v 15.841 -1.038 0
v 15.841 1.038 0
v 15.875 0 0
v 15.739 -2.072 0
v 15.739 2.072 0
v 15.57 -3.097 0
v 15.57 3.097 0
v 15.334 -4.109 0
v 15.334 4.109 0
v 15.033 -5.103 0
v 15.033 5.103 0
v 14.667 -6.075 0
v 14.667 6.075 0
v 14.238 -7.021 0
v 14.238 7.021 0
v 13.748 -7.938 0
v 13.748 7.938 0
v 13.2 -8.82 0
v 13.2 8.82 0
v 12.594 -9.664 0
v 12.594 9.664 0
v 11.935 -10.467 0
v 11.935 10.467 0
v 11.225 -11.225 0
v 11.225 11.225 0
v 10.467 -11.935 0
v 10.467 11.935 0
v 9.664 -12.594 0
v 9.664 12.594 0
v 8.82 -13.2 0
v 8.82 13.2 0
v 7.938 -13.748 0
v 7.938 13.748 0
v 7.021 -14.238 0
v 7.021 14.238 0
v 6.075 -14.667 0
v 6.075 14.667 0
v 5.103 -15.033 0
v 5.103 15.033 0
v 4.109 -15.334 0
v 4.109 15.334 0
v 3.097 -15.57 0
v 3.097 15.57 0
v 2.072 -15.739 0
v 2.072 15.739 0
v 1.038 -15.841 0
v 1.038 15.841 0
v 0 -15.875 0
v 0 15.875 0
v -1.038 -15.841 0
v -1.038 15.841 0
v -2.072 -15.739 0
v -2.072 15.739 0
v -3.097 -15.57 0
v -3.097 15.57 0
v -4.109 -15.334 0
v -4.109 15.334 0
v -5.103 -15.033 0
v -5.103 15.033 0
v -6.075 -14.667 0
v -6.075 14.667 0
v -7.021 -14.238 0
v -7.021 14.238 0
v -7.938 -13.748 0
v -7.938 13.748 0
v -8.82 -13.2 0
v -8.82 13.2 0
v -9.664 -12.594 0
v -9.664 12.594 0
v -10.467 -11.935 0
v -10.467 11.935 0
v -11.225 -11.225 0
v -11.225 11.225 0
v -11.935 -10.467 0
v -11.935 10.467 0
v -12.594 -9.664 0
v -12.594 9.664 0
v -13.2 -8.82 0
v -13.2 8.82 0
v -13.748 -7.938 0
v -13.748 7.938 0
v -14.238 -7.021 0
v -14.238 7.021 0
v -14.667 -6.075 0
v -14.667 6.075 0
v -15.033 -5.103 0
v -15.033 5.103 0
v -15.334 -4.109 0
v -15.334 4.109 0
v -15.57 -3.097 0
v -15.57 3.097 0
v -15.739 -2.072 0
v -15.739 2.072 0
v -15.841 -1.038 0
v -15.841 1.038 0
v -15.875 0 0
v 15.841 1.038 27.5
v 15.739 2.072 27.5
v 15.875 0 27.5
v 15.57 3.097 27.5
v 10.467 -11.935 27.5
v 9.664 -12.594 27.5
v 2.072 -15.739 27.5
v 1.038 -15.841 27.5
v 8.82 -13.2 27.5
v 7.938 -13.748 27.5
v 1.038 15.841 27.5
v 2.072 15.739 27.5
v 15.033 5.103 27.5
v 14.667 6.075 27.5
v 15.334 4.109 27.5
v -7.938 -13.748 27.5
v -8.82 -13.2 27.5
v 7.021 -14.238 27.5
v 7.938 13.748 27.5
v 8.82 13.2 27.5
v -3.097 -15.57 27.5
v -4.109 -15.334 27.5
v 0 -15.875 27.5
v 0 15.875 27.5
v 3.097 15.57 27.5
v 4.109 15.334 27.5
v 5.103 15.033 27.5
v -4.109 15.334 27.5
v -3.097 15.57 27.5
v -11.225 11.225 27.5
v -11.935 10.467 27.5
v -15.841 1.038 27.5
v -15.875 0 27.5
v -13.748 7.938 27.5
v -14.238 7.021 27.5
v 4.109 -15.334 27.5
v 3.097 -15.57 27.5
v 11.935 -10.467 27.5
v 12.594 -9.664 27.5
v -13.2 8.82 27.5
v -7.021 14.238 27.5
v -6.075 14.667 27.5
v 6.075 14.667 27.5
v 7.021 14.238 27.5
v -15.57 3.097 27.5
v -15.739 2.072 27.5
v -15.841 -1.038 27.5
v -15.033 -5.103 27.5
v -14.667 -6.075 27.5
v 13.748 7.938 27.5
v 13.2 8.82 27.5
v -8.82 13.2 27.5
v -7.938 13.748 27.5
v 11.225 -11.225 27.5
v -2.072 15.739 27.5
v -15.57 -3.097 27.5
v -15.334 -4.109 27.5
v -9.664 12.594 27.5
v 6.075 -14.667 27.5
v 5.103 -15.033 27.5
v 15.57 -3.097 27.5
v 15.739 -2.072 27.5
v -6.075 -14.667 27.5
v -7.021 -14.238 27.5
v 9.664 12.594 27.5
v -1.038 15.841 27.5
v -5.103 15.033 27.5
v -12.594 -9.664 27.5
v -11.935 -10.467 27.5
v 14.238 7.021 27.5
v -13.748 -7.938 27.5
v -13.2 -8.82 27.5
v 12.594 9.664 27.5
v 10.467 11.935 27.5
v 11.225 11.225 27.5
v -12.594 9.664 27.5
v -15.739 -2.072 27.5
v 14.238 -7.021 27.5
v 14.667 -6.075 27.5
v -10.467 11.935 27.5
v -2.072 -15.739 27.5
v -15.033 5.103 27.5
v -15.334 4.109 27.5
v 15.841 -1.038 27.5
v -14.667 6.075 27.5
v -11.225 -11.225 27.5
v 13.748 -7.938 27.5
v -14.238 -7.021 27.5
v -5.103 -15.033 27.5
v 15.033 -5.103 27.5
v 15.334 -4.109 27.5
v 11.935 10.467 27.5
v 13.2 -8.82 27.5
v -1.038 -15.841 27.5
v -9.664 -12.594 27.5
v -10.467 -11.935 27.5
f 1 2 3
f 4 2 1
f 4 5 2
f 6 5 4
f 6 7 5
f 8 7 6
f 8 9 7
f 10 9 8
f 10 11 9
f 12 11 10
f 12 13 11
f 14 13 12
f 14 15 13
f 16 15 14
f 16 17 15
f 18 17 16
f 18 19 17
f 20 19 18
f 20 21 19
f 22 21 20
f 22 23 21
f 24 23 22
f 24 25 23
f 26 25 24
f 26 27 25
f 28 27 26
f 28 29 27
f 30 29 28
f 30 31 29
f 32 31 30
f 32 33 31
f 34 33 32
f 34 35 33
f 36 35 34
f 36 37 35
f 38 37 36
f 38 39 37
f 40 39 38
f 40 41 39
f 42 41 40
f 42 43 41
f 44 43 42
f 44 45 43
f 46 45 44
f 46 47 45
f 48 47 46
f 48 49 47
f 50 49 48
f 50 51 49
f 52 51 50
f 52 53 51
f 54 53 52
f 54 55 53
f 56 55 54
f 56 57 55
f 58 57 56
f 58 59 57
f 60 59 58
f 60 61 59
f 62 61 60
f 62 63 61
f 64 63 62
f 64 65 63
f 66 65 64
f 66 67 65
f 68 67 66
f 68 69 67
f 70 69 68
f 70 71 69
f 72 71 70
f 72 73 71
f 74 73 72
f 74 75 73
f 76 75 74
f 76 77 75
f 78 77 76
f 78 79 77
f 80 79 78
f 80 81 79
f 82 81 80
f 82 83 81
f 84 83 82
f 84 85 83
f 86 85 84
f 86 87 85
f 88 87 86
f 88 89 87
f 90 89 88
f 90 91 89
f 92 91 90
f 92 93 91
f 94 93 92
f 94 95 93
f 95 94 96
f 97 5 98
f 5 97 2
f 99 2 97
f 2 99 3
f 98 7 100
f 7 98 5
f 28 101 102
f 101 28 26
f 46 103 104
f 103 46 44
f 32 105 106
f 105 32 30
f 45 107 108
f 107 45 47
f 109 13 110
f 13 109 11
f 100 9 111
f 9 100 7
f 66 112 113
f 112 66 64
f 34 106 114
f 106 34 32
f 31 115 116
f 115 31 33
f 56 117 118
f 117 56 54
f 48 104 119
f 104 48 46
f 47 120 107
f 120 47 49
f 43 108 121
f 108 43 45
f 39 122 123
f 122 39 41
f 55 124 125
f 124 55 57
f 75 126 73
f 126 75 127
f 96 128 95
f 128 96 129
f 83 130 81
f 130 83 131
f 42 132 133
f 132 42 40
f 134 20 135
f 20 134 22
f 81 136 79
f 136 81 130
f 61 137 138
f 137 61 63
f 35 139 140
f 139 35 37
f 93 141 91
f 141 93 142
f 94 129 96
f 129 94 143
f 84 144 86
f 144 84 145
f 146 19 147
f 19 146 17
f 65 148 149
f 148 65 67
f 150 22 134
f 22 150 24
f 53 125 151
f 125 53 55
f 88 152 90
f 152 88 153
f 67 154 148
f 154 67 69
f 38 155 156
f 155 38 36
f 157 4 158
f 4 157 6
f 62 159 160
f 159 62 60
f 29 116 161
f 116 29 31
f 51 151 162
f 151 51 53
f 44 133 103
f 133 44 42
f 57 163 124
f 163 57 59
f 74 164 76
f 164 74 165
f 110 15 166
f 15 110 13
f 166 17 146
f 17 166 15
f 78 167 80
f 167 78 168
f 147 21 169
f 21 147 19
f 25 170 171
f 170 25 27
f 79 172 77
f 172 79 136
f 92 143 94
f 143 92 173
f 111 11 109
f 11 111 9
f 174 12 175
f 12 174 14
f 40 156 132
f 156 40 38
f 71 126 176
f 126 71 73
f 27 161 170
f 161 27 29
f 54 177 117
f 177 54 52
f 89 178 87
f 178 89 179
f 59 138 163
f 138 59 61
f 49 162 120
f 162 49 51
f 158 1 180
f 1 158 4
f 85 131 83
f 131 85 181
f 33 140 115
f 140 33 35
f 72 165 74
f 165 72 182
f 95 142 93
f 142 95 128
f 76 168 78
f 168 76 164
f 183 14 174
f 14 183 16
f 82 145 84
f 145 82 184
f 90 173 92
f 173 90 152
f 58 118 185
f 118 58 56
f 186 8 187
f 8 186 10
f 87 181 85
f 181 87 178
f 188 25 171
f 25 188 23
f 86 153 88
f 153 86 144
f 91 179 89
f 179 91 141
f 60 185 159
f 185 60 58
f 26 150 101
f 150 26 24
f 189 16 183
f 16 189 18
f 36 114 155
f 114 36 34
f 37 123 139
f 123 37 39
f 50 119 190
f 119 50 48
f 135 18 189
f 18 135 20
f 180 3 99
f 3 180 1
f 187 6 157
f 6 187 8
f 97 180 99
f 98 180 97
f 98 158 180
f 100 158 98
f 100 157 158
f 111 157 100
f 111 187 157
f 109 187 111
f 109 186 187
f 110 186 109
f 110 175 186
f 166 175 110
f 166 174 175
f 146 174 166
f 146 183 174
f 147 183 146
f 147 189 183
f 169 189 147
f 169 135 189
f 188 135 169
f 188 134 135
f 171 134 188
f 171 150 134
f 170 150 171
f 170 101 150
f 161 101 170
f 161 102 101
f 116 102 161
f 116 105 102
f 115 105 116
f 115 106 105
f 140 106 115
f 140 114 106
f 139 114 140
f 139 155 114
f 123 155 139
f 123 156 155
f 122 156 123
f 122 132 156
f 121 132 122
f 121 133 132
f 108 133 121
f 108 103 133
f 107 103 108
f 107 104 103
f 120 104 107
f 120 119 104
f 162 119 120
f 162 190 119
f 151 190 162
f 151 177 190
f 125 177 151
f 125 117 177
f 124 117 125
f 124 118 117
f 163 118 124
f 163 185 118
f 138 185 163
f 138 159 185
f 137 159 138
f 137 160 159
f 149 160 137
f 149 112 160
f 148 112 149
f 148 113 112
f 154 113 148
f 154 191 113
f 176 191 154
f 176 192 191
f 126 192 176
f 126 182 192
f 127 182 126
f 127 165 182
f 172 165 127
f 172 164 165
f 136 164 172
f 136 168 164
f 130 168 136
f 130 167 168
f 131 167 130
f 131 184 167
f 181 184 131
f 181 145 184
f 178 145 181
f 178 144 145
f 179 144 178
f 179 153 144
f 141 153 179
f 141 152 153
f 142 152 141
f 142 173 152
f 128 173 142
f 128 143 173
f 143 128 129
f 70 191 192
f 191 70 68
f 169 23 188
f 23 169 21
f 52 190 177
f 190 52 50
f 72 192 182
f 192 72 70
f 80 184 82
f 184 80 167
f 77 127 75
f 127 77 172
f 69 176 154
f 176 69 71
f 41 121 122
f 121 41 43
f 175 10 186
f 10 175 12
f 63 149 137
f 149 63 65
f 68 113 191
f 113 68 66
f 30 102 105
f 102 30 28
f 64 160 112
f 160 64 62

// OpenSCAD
// concept_cube_slots.scad
// -----------------------------------------------------------------------------
// STARTER TEMPLATE for ST8 (3D packaging). Encodes the USER'S idea — a cube with
// a slot on each face to hold an LCC02046 carrier, no glue — as parametric
// "Concept A". The ST8 run should (a) refine this, (b) author 2-3 genuinely
// different concepts as sibling .scad files, and (c) render + export each.
//
// This is a starting geometry, NOT the final design. It has NOT been fit-checked
// against real bond-wire/harness clearances — that's ST8's job.
//
// Render PNG:   openscad -o conceptA.png --imgsize=1400,1000 --camera=0,0,0,55,0,25,140 --render concept_cube_slots.scad
// Export STL:   openscad -o conceptA.stl --render concept_cube_slots.scad
// (CAD kernel / STEP export path for the run: see build123d_concept.py + README.md)
// -----------------------------------------------------------------------------

// ---- envelope (hard constraints) ----
ENV_D   = 31.75;   // cylinder diameter [mm] = 1.25 in
ENV_H   = 27.5;    // cylinder height  [mm] = 2.75 cm
show_envelope = true;

// ---- carrier (LCC02046) ----
LCC     = 8.89;    // square edge [mm] = 0.350 in
LCC_T   = 1.65;    // thickness   [mm] = 0.065 in
CLR     = 0.15;    // slot clearance per side [mm] (tune vs ceramic tolerance)

// ---- cube + retention ----
cube_edge = 18.0;  // must satisfy cube_edge*sqrt(2) <= ENV_D  (=> <= 22.45)
lip       = 0.8;   // retention lip that overlaps the carrier edge (no glue)
slot_depth= LCC_T + 0.3;
stand_d   = 8.0;   // stand diameter
stand_h   = 3.0;   // stand height
faces_used = 3;    // 3 = orthogonal 3-axis (recommended); set 6 to show all

// ---- envelope fit echo (the run should assert this) ----
echo(str("cube cross-section corner radius = ", cube_edge*sqrt(2)/2,
         " mm  (must be <= ", ENV_D/2, ")"));
echo(str("stack height = ", stand_h + cube_edge, " mm  (must be <= ", ENV_H, ")"));

module envelope() {
  color([0.75,0.1,0.1,0.12])
    translate([0,0,0]) cylinder(h=ENV_H, d=ENV_D, $fn=96);
}

// a slot pocket + carrier cutout on +Z face of a unit cube centered at origin
module face_slot() {
  // pocket the carrier drops into, with a retention lip framing the top opening
  translate([0,0,cube_edge/2 - slot_depth])
    cube([LCC+2*CLR, LCC+2*CLR, slot_depth+0.1], center=true);
  // top opening slightly smaller than the carrier -> lip retains it (no glue)
  translate([0,0,cube_edge/2 - lip/2])
    cube([LCC+2*CLR-2*lip, LCC+2*CLR-2*lip, lip+0.2], center=true);
}

module cube_with_slots() {
  difference() {
    cube(cube_edge, center=true);
    // +Z, +X, +Y faces for orthogonal 3-axis; extend to 6 if faces_used==6
    face_slot();                                   // +Z
    rotate([0,90,0])  face_slot();                 // +X
    rotate([-90,0,0]) face_slot();                 // +Y
    if (faces_used==6) {
      rotate([0,-90,0]) face_slot();               // -X
      rotate([90,0,0])  face_slot();               // -Y
      rotate([180,0,0]) face_slot();               // -Z
    }
    // TODO(ST8): harness routing channels from each pocket down to the stand,
    // wire-bond clearance relief, keying notch for pin-1 orientation.
  }
}

module assembly() {
  // stand on the flange
  color([0.8,0.85,0.9]) translate([0,0,0]) cylinder(h=stand_h, d=stand_d, $fn=64);
  // cube centered above the stand
  color([0.85,0.9,1.0]) translate([0,0,stand_h + cube_edge/2]) cube_with_slots();
  // one carrier shown seated in the +Z slot (for scale)
  color([1,0.95,0.75])
    translate([0,0,stand_h + cube_edge - LCC_T/2])
      cube([LCC,LCC,LCC_T], center=true);
}

assembly();
if (show_envelope) envelope();
